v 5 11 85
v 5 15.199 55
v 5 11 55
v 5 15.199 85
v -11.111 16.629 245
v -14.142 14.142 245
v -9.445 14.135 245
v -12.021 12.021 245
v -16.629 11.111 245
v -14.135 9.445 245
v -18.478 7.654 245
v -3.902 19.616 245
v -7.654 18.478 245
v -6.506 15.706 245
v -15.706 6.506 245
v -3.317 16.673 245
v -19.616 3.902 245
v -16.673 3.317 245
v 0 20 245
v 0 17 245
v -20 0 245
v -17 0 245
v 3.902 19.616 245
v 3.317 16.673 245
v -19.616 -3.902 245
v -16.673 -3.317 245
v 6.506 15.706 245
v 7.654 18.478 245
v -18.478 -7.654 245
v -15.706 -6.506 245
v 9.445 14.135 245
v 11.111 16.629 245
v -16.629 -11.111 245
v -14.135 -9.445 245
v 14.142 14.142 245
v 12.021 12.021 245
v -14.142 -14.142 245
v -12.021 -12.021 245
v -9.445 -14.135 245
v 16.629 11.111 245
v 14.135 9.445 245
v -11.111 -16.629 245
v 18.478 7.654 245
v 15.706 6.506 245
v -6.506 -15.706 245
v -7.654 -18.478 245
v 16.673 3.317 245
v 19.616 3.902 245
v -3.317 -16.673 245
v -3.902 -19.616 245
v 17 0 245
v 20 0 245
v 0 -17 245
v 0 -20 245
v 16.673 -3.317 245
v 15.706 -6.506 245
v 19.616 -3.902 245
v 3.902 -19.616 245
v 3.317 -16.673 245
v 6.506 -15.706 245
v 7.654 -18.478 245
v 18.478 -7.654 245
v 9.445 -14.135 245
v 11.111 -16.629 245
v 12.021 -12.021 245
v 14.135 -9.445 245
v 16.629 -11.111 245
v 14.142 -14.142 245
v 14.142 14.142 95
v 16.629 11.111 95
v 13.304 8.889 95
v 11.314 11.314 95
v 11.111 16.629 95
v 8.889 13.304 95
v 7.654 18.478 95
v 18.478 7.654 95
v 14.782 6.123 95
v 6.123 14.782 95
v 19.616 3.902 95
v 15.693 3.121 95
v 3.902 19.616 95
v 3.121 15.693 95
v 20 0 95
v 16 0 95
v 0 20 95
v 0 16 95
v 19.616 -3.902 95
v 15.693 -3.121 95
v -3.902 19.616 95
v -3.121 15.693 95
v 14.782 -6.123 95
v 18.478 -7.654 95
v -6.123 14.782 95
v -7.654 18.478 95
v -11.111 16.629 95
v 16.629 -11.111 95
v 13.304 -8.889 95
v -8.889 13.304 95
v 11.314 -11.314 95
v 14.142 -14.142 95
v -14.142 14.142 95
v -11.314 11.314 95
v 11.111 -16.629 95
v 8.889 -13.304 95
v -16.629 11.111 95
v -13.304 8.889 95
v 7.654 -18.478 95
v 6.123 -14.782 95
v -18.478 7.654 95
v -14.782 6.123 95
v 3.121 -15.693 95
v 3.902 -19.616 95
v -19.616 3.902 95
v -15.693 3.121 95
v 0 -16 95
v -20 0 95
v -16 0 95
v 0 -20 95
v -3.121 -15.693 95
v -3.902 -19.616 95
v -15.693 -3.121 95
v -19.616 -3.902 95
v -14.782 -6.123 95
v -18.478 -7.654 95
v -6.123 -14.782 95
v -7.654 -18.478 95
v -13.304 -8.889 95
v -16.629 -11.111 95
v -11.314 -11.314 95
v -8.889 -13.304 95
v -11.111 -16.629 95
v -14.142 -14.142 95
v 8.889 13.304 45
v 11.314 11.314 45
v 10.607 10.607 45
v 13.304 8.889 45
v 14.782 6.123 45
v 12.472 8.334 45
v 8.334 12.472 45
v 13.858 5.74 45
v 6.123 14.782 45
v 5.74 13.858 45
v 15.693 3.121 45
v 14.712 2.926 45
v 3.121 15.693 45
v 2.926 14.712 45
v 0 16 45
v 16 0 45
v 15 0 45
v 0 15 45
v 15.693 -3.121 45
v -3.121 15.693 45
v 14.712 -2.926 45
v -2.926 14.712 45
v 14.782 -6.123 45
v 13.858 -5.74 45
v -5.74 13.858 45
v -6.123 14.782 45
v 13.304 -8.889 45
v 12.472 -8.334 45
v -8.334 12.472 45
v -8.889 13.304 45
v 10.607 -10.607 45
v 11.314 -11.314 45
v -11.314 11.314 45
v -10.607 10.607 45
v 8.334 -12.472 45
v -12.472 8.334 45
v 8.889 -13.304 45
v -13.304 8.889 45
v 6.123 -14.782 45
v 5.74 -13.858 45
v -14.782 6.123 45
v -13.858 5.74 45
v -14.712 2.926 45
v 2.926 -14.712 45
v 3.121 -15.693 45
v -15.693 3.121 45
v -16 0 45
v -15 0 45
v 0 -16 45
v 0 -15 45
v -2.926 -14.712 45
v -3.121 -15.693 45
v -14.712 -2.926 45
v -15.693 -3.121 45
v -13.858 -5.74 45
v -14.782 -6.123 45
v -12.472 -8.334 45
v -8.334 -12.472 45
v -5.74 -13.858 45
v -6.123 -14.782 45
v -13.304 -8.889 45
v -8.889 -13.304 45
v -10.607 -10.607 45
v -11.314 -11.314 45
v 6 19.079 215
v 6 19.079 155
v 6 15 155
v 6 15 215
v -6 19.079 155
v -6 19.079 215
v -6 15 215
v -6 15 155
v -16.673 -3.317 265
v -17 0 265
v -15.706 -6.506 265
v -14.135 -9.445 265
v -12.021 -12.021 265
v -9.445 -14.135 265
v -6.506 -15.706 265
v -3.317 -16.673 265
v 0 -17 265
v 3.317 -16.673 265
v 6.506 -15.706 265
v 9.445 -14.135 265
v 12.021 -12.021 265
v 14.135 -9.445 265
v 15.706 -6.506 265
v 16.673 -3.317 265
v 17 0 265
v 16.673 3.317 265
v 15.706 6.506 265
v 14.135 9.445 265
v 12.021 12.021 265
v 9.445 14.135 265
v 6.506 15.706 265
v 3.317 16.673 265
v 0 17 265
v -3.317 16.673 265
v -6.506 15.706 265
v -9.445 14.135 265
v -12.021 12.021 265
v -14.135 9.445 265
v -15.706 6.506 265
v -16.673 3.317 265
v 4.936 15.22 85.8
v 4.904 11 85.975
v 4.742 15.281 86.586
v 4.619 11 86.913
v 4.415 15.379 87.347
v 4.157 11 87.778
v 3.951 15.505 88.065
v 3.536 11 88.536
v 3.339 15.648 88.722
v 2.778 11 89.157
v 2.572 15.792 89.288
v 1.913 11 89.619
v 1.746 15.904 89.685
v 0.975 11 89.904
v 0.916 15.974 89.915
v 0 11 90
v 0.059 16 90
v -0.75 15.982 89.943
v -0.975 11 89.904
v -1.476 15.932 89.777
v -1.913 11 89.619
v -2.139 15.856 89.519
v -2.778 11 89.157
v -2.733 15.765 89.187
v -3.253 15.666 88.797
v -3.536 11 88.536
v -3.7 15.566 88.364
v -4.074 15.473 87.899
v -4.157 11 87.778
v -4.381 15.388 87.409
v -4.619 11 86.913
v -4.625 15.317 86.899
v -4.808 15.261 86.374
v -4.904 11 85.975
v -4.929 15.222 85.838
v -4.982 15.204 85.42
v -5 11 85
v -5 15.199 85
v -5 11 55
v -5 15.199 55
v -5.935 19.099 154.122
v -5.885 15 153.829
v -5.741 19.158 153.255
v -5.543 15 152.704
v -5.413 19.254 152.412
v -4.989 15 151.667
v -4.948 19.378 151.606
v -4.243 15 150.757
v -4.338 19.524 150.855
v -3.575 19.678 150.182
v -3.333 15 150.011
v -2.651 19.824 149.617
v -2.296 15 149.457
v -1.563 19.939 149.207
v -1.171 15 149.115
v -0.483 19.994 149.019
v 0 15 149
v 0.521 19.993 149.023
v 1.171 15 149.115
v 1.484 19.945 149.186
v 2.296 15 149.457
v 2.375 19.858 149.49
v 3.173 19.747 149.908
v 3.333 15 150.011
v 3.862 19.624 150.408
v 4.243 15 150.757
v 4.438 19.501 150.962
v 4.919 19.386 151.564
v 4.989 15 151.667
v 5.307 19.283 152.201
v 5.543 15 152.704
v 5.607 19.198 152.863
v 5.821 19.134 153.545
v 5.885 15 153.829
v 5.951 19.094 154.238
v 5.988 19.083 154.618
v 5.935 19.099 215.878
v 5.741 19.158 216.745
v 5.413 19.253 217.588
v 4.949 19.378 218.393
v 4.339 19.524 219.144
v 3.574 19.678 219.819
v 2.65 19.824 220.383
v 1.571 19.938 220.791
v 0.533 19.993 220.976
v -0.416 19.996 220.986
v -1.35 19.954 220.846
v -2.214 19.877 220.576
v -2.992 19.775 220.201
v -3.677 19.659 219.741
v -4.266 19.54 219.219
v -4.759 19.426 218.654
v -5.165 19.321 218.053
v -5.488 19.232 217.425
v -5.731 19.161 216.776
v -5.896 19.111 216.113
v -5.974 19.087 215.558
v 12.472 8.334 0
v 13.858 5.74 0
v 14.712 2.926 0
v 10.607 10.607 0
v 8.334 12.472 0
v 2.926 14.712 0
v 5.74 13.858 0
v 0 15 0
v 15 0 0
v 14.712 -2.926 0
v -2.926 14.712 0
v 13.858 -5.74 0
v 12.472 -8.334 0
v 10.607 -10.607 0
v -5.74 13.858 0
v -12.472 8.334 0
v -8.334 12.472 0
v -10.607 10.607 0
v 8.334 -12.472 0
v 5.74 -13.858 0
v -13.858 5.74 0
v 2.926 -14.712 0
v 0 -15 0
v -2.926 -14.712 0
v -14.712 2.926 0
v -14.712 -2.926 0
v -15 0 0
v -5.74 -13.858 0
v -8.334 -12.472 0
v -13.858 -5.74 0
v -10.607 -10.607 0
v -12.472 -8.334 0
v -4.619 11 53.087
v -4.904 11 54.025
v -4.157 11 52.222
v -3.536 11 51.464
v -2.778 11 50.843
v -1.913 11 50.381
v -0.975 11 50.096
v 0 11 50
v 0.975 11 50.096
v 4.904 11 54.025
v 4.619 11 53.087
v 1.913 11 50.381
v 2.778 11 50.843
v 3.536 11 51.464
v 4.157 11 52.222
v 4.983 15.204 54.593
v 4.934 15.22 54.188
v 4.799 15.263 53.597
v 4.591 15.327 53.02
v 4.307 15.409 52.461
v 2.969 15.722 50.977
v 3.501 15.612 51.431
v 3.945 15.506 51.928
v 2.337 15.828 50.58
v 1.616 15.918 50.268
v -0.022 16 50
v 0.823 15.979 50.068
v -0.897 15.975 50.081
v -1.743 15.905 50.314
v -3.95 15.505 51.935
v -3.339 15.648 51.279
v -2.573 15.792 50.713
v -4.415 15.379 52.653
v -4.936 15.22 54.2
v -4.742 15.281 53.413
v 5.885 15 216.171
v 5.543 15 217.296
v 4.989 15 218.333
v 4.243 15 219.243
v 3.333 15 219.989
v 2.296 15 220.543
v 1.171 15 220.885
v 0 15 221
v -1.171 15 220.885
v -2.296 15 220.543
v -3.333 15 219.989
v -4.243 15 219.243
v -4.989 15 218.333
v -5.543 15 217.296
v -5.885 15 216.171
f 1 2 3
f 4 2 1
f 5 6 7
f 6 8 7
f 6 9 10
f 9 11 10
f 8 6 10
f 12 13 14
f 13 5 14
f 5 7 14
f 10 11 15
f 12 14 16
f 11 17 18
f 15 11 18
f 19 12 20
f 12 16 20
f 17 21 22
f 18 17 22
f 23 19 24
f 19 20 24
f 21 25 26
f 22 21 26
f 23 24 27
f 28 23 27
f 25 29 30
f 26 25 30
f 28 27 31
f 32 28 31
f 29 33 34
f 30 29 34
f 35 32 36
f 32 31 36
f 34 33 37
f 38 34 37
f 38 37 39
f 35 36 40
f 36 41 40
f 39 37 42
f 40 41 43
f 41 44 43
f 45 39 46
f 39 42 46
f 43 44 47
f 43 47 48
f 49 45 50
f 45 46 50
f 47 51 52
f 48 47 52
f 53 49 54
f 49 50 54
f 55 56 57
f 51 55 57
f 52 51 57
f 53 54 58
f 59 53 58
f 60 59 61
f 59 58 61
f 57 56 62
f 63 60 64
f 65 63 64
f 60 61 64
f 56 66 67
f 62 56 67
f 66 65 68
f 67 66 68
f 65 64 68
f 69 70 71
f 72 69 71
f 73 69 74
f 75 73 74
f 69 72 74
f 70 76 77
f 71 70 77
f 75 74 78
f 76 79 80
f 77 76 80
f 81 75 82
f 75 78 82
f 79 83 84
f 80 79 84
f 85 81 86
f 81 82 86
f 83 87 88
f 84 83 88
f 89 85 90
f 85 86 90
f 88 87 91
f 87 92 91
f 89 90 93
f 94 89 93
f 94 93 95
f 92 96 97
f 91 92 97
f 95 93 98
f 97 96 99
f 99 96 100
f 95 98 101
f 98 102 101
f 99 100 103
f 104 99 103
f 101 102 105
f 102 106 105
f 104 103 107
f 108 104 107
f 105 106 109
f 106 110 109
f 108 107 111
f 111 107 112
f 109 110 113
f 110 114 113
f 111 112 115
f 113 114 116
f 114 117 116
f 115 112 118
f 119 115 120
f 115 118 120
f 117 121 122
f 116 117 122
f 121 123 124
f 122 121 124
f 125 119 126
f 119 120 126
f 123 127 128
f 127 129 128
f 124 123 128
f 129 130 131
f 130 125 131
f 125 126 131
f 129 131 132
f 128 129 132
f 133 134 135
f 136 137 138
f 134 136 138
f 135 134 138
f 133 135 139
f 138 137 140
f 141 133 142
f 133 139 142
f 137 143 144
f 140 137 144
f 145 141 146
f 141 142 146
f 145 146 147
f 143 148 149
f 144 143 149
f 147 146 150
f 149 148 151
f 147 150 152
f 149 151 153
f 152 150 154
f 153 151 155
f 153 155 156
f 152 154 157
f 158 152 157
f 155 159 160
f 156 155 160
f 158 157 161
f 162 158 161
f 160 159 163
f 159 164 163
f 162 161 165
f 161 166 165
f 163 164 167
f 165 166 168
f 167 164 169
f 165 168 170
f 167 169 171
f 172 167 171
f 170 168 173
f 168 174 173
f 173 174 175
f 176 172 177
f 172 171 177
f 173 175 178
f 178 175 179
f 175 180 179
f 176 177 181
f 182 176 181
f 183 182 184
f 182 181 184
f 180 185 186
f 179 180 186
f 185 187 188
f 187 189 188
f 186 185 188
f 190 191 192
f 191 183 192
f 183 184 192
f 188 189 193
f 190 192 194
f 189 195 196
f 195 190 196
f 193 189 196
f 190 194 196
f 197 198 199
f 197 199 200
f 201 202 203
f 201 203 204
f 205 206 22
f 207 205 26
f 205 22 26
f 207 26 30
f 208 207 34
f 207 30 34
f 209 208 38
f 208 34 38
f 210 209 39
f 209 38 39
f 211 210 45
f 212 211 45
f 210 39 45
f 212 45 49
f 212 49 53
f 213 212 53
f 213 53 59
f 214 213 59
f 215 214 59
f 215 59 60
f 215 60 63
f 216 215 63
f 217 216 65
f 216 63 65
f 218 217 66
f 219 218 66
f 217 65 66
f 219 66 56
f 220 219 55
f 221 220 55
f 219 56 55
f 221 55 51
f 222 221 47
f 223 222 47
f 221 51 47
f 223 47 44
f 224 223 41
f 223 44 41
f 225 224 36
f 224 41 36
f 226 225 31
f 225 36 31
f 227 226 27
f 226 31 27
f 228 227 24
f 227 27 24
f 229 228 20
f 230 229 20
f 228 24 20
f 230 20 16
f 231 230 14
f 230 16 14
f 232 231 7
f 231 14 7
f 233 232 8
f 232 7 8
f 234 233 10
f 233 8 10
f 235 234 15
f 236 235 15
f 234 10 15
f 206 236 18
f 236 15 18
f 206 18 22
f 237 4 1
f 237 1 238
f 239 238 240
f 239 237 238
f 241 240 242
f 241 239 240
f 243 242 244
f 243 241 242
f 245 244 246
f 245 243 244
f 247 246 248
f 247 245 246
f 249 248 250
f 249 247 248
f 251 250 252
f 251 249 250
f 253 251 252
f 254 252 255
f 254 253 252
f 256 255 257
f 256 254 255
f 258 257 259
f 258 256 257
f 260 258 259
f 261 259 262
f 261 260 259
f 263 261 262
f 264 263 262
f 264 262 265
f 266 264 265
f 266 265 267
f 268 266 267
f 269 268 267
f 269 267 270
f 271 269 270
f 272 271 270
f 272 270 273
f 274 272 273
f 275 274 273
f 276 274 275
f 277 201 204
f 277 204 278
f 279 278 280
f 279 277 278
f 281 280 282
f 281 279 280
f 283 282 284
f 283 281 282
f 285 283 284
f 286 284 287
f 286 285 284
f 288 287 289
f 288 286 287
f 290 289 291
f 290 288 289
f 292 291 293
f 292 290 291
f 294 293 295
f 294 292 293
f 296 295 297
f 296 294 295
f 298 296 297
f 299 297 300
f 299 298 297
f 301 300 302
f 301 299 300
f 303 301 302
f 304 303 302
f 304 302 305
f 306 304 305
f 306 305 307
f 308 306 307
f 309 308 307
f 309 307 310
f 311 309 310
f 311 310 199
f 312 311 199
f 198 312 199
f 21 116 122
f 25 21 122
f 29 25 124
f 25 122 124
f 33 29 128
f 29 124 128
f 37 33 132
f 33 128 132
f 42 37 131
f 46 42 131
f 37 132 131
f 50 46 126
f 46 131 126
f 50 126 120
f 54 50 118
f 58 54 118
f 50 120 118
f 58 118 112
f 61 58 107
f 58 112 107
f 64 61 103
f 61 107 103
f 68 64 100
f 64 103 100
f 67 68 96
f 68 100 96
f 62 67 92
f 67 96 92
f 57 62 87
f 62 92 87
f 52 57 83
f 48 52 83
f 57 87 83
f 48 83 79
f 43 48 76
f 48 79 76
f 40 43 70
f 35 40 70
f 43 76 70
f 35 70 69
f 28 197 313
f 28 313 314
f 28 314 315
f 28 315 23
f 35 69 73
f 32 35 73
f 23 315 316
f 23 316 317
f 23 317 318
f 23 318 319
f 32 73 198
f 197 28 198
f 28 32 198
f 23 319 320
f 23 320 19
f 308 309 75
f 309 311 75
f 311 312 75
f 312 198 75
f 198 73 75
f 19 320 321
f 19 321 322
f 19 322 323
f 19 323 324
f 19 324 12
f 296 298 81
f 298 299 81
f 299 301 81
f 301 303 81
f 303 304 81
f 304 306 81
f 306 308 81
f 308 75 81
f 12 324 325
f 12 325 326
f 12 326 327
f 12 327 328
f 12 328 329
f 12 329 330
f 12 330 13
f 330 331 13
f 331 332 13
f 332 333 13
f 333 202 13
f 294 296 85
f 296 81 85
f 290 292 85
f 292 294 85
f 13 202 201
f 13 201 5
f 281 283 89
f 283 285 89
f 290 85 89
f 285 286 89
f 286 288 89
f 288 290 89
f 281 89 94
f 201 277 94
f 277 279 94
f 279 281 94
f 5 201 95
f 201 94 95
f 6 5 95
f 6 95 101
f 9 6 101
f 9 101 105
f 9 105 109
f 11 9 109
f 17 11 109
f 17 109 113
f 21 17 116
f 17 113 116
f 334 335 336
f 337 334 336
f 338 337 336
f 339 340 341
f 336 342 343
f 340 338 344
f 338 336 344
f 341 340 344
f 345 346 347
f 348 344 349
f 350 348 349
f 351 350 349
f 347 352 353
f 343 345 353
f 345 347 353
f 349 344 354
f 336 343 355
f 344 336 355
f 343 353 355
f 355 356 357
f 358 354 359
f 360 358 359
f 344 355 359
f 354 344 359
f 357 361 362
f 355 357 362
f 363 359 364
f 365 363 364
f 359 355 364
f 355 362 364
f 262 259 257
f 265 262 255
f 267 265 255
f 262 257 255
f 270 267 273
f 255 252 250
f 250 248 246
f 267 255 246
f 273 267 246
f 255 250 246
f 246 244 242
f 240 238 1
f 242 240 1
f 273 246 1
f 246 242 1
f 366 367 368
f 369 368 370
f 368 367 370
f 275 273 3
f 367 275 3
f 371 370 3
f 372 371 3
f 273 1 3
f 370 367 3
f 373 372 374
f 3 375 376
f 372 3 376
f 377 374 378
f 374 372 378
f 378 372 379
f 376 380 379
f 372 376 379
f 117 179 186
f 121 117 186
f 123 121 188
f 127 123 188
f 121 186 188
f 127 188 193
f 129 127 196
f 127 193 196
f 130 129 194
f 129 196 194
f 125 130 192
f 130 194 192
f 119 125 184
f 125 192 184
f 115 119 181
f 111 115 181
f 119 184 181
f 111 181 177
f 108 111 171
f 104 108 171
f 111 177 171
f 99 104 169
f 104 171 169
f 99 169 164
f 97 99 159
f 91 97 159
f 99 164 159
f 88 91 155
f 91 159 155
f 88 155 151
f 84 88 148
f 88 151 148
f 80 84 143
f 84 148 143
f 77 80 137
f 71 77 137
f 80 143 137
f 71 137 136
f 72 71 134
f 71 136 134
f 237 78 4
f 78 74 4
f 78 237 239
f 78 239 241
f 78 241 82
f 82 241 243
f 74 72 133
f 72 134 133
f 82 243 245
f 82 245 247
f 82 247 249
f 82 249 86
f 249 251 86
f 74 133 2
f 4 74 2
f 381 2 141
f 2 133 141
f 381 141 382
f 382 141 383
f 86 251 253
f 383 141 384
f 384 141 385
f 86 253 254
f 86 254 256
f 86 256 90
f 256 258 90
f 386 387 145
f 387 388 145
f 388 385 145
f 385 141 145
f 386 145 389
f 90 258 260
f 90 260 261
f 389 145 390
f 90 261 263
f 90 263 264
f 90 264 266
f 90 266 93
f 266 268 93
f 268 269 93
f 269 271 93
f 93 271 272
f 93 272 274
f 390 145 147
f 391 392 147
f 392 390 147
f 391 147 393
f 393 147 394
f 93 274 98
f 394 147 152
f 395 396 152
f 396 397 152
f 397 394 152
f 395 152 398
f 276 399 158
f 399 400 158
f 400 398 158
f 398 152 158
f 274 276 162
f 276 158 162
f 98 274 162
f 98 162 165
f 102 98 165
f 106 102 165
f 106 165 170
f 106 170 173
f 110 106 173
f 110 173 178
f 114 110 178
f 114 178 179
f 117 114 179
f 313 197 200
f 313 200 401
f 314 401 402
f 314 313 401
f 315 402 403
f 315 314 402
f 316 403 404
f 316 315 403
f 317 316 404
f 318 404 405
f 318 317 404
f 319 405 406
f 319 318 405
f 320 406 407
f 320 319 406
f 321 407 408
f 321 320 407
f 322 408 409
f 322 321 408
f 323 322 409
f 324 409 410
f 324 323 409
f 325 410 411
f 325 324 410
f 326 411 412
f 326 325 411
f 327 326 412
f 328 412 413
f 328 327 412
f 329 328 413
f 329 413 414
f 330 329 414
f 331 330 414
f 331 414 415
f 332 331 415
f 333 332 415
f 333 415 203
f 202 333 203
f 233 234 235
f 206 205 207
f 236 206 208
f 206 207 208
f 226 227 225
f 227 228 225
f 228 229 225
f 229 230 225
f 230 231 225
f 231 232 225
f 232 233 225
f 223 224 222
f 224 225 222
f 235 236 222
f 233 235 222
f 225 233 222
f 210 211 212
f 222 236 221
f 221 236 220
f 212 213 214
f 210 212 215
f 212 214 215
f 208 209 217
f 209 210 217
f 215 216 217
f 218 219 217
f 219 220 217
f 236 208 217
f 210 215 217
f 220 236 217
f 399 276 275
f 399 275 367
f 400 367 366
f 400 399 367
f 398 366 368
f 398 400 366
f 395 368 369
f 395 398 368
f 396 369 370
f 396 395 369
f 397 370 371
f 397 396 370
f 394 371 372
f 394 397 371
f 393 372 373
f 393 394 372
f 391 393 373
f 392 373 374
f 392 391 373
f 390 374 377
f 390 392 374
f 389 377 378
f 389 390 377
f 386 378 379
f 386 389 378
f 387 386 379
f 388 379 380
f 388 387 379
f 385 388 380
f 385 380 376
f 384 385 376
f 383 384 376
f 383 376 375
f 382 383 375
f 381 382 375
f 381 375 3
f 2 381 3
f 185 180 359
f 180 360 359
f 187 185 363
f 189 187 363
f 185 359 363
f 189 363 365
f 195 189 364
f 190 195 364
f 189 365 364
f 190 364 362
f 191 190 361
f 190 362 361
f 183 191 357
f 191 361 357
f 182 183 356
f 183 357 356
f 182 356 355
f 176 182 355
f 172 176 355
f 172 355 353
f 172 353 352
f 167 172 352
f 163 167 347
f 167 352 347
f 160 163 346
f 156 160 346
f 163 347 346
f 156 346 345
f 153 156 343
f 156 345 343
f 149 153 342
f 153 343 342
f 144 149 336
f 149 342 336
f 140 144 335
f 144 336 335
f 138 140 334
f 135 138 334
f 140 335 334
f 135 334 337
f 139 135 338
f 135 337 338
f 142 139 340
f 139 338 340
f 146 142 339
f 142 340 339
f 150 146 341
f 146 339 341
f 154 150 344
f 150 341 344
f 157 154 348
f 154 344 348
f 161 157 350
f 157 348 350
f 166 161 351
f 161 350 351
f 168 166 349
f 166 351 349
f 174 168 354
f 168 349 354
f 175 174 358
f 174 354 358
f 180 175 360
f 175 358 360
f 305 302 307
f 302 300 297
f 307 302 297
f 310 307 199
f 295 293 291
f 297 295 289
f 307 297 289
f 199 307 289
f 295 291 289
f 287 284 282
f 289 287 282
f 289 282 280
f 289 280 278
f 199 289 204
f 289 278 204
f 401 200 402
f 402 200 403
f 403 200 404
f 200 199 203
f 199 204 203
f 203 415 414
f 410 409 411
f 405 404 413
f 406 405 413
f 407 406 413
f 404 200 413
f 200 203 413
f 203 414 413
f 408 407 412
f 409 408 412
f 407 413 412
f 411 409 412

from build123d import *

# Parameters (mm, degrees)
CUT_EXTRUDE1_DEPTH  = 5
CUT_EXTRUDE11_DEPTH = 5


with BuildPart() as part:
    # Sketch1 → Revolve1 (revolve)
    with BuildSketch(Plane(origin=(0, 0, 0), x_dir=(1, 0, 0), z_dir=(0, 1, 0)), mode=Mode.PRIVATE) as revolve1_sk:
        Polygon((0, 0), (0, -265), (17, -265), (17, -245), (20, -245), (20, -95), (16, -95), (16, -45), (15, -45), (15, 0), align=None)
    revolve(revolve1_sk.sketch.rotate(Axis((0, 0, 0), (0, 0, 1)), 180), axis=Axis((0, 0, 0), (0, 0, 1)))

    # Sketch3 → Cut-Extrude1 (cut)
    with BuildSketch(Plane(origin=(2.233419524, 16, 45), x_dir=(0, 0, -1), z_dir=(0, -1, 0))):
        with BuildLine():
            Line((-10, 2.766580476), (-40, 2.766580476))
            ThreePointArc((-40, 2.766580476), (-45, -2.233419524), (-40, -7.233419524))
            Line((-40, -7.233419524), (-10, -7.233419524))
            ThreePointArc((-10, -7.233419524), (-5, -2.233419524), (-10, 2.766580476))
        make_face()
    extrude(amount=CUT_EXTRUDE1_DEPTH, mode=Mode.SUBTRACT)

    # Sketch31 → Cut-Extrude11 (cut)
    with BuildSketch(Plane(origin=(1.137793825, 20, 245), x_dir=(0, 0, 1), z_dir=(0, -1, 0))):
        with BuildLine():
            Line((-30, 7.137793825), (-90, 7.137793825))
            ThreePointArc((-90, 7.137793825), (-96, 1.137793825), (-90, -4.862206175))
            Line((-90, -4.862206175), (-30, -4.862206175))
            ThreePointArc((-30, -4.862206175), (-24, 1.137793825), (-30, 7.137793825))
        make_face()
    extrude(amount=CUT_EXTRUDE11_DEPTH, mode=Mode.SUBTRACT)


solid = part.part
